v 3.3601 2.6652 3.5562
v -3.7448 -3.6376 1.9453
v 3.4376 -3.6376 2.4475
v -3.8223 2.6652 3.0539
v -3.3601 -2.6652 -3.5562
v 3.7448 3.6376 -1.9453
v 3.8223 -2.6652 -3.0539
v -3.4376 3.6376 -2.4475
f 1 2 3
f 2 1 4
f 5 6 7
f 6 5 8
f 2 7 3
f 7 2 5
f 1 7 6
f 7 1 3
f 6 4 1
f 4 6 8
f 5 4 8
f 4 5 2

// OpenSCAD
//andesite alloy for minetest mod fabricate

size=8; //block=32 //item=8


rotate([10,-4,0]){
cube([size*0.9,size*0.8,size*0.7],center=true);

};
